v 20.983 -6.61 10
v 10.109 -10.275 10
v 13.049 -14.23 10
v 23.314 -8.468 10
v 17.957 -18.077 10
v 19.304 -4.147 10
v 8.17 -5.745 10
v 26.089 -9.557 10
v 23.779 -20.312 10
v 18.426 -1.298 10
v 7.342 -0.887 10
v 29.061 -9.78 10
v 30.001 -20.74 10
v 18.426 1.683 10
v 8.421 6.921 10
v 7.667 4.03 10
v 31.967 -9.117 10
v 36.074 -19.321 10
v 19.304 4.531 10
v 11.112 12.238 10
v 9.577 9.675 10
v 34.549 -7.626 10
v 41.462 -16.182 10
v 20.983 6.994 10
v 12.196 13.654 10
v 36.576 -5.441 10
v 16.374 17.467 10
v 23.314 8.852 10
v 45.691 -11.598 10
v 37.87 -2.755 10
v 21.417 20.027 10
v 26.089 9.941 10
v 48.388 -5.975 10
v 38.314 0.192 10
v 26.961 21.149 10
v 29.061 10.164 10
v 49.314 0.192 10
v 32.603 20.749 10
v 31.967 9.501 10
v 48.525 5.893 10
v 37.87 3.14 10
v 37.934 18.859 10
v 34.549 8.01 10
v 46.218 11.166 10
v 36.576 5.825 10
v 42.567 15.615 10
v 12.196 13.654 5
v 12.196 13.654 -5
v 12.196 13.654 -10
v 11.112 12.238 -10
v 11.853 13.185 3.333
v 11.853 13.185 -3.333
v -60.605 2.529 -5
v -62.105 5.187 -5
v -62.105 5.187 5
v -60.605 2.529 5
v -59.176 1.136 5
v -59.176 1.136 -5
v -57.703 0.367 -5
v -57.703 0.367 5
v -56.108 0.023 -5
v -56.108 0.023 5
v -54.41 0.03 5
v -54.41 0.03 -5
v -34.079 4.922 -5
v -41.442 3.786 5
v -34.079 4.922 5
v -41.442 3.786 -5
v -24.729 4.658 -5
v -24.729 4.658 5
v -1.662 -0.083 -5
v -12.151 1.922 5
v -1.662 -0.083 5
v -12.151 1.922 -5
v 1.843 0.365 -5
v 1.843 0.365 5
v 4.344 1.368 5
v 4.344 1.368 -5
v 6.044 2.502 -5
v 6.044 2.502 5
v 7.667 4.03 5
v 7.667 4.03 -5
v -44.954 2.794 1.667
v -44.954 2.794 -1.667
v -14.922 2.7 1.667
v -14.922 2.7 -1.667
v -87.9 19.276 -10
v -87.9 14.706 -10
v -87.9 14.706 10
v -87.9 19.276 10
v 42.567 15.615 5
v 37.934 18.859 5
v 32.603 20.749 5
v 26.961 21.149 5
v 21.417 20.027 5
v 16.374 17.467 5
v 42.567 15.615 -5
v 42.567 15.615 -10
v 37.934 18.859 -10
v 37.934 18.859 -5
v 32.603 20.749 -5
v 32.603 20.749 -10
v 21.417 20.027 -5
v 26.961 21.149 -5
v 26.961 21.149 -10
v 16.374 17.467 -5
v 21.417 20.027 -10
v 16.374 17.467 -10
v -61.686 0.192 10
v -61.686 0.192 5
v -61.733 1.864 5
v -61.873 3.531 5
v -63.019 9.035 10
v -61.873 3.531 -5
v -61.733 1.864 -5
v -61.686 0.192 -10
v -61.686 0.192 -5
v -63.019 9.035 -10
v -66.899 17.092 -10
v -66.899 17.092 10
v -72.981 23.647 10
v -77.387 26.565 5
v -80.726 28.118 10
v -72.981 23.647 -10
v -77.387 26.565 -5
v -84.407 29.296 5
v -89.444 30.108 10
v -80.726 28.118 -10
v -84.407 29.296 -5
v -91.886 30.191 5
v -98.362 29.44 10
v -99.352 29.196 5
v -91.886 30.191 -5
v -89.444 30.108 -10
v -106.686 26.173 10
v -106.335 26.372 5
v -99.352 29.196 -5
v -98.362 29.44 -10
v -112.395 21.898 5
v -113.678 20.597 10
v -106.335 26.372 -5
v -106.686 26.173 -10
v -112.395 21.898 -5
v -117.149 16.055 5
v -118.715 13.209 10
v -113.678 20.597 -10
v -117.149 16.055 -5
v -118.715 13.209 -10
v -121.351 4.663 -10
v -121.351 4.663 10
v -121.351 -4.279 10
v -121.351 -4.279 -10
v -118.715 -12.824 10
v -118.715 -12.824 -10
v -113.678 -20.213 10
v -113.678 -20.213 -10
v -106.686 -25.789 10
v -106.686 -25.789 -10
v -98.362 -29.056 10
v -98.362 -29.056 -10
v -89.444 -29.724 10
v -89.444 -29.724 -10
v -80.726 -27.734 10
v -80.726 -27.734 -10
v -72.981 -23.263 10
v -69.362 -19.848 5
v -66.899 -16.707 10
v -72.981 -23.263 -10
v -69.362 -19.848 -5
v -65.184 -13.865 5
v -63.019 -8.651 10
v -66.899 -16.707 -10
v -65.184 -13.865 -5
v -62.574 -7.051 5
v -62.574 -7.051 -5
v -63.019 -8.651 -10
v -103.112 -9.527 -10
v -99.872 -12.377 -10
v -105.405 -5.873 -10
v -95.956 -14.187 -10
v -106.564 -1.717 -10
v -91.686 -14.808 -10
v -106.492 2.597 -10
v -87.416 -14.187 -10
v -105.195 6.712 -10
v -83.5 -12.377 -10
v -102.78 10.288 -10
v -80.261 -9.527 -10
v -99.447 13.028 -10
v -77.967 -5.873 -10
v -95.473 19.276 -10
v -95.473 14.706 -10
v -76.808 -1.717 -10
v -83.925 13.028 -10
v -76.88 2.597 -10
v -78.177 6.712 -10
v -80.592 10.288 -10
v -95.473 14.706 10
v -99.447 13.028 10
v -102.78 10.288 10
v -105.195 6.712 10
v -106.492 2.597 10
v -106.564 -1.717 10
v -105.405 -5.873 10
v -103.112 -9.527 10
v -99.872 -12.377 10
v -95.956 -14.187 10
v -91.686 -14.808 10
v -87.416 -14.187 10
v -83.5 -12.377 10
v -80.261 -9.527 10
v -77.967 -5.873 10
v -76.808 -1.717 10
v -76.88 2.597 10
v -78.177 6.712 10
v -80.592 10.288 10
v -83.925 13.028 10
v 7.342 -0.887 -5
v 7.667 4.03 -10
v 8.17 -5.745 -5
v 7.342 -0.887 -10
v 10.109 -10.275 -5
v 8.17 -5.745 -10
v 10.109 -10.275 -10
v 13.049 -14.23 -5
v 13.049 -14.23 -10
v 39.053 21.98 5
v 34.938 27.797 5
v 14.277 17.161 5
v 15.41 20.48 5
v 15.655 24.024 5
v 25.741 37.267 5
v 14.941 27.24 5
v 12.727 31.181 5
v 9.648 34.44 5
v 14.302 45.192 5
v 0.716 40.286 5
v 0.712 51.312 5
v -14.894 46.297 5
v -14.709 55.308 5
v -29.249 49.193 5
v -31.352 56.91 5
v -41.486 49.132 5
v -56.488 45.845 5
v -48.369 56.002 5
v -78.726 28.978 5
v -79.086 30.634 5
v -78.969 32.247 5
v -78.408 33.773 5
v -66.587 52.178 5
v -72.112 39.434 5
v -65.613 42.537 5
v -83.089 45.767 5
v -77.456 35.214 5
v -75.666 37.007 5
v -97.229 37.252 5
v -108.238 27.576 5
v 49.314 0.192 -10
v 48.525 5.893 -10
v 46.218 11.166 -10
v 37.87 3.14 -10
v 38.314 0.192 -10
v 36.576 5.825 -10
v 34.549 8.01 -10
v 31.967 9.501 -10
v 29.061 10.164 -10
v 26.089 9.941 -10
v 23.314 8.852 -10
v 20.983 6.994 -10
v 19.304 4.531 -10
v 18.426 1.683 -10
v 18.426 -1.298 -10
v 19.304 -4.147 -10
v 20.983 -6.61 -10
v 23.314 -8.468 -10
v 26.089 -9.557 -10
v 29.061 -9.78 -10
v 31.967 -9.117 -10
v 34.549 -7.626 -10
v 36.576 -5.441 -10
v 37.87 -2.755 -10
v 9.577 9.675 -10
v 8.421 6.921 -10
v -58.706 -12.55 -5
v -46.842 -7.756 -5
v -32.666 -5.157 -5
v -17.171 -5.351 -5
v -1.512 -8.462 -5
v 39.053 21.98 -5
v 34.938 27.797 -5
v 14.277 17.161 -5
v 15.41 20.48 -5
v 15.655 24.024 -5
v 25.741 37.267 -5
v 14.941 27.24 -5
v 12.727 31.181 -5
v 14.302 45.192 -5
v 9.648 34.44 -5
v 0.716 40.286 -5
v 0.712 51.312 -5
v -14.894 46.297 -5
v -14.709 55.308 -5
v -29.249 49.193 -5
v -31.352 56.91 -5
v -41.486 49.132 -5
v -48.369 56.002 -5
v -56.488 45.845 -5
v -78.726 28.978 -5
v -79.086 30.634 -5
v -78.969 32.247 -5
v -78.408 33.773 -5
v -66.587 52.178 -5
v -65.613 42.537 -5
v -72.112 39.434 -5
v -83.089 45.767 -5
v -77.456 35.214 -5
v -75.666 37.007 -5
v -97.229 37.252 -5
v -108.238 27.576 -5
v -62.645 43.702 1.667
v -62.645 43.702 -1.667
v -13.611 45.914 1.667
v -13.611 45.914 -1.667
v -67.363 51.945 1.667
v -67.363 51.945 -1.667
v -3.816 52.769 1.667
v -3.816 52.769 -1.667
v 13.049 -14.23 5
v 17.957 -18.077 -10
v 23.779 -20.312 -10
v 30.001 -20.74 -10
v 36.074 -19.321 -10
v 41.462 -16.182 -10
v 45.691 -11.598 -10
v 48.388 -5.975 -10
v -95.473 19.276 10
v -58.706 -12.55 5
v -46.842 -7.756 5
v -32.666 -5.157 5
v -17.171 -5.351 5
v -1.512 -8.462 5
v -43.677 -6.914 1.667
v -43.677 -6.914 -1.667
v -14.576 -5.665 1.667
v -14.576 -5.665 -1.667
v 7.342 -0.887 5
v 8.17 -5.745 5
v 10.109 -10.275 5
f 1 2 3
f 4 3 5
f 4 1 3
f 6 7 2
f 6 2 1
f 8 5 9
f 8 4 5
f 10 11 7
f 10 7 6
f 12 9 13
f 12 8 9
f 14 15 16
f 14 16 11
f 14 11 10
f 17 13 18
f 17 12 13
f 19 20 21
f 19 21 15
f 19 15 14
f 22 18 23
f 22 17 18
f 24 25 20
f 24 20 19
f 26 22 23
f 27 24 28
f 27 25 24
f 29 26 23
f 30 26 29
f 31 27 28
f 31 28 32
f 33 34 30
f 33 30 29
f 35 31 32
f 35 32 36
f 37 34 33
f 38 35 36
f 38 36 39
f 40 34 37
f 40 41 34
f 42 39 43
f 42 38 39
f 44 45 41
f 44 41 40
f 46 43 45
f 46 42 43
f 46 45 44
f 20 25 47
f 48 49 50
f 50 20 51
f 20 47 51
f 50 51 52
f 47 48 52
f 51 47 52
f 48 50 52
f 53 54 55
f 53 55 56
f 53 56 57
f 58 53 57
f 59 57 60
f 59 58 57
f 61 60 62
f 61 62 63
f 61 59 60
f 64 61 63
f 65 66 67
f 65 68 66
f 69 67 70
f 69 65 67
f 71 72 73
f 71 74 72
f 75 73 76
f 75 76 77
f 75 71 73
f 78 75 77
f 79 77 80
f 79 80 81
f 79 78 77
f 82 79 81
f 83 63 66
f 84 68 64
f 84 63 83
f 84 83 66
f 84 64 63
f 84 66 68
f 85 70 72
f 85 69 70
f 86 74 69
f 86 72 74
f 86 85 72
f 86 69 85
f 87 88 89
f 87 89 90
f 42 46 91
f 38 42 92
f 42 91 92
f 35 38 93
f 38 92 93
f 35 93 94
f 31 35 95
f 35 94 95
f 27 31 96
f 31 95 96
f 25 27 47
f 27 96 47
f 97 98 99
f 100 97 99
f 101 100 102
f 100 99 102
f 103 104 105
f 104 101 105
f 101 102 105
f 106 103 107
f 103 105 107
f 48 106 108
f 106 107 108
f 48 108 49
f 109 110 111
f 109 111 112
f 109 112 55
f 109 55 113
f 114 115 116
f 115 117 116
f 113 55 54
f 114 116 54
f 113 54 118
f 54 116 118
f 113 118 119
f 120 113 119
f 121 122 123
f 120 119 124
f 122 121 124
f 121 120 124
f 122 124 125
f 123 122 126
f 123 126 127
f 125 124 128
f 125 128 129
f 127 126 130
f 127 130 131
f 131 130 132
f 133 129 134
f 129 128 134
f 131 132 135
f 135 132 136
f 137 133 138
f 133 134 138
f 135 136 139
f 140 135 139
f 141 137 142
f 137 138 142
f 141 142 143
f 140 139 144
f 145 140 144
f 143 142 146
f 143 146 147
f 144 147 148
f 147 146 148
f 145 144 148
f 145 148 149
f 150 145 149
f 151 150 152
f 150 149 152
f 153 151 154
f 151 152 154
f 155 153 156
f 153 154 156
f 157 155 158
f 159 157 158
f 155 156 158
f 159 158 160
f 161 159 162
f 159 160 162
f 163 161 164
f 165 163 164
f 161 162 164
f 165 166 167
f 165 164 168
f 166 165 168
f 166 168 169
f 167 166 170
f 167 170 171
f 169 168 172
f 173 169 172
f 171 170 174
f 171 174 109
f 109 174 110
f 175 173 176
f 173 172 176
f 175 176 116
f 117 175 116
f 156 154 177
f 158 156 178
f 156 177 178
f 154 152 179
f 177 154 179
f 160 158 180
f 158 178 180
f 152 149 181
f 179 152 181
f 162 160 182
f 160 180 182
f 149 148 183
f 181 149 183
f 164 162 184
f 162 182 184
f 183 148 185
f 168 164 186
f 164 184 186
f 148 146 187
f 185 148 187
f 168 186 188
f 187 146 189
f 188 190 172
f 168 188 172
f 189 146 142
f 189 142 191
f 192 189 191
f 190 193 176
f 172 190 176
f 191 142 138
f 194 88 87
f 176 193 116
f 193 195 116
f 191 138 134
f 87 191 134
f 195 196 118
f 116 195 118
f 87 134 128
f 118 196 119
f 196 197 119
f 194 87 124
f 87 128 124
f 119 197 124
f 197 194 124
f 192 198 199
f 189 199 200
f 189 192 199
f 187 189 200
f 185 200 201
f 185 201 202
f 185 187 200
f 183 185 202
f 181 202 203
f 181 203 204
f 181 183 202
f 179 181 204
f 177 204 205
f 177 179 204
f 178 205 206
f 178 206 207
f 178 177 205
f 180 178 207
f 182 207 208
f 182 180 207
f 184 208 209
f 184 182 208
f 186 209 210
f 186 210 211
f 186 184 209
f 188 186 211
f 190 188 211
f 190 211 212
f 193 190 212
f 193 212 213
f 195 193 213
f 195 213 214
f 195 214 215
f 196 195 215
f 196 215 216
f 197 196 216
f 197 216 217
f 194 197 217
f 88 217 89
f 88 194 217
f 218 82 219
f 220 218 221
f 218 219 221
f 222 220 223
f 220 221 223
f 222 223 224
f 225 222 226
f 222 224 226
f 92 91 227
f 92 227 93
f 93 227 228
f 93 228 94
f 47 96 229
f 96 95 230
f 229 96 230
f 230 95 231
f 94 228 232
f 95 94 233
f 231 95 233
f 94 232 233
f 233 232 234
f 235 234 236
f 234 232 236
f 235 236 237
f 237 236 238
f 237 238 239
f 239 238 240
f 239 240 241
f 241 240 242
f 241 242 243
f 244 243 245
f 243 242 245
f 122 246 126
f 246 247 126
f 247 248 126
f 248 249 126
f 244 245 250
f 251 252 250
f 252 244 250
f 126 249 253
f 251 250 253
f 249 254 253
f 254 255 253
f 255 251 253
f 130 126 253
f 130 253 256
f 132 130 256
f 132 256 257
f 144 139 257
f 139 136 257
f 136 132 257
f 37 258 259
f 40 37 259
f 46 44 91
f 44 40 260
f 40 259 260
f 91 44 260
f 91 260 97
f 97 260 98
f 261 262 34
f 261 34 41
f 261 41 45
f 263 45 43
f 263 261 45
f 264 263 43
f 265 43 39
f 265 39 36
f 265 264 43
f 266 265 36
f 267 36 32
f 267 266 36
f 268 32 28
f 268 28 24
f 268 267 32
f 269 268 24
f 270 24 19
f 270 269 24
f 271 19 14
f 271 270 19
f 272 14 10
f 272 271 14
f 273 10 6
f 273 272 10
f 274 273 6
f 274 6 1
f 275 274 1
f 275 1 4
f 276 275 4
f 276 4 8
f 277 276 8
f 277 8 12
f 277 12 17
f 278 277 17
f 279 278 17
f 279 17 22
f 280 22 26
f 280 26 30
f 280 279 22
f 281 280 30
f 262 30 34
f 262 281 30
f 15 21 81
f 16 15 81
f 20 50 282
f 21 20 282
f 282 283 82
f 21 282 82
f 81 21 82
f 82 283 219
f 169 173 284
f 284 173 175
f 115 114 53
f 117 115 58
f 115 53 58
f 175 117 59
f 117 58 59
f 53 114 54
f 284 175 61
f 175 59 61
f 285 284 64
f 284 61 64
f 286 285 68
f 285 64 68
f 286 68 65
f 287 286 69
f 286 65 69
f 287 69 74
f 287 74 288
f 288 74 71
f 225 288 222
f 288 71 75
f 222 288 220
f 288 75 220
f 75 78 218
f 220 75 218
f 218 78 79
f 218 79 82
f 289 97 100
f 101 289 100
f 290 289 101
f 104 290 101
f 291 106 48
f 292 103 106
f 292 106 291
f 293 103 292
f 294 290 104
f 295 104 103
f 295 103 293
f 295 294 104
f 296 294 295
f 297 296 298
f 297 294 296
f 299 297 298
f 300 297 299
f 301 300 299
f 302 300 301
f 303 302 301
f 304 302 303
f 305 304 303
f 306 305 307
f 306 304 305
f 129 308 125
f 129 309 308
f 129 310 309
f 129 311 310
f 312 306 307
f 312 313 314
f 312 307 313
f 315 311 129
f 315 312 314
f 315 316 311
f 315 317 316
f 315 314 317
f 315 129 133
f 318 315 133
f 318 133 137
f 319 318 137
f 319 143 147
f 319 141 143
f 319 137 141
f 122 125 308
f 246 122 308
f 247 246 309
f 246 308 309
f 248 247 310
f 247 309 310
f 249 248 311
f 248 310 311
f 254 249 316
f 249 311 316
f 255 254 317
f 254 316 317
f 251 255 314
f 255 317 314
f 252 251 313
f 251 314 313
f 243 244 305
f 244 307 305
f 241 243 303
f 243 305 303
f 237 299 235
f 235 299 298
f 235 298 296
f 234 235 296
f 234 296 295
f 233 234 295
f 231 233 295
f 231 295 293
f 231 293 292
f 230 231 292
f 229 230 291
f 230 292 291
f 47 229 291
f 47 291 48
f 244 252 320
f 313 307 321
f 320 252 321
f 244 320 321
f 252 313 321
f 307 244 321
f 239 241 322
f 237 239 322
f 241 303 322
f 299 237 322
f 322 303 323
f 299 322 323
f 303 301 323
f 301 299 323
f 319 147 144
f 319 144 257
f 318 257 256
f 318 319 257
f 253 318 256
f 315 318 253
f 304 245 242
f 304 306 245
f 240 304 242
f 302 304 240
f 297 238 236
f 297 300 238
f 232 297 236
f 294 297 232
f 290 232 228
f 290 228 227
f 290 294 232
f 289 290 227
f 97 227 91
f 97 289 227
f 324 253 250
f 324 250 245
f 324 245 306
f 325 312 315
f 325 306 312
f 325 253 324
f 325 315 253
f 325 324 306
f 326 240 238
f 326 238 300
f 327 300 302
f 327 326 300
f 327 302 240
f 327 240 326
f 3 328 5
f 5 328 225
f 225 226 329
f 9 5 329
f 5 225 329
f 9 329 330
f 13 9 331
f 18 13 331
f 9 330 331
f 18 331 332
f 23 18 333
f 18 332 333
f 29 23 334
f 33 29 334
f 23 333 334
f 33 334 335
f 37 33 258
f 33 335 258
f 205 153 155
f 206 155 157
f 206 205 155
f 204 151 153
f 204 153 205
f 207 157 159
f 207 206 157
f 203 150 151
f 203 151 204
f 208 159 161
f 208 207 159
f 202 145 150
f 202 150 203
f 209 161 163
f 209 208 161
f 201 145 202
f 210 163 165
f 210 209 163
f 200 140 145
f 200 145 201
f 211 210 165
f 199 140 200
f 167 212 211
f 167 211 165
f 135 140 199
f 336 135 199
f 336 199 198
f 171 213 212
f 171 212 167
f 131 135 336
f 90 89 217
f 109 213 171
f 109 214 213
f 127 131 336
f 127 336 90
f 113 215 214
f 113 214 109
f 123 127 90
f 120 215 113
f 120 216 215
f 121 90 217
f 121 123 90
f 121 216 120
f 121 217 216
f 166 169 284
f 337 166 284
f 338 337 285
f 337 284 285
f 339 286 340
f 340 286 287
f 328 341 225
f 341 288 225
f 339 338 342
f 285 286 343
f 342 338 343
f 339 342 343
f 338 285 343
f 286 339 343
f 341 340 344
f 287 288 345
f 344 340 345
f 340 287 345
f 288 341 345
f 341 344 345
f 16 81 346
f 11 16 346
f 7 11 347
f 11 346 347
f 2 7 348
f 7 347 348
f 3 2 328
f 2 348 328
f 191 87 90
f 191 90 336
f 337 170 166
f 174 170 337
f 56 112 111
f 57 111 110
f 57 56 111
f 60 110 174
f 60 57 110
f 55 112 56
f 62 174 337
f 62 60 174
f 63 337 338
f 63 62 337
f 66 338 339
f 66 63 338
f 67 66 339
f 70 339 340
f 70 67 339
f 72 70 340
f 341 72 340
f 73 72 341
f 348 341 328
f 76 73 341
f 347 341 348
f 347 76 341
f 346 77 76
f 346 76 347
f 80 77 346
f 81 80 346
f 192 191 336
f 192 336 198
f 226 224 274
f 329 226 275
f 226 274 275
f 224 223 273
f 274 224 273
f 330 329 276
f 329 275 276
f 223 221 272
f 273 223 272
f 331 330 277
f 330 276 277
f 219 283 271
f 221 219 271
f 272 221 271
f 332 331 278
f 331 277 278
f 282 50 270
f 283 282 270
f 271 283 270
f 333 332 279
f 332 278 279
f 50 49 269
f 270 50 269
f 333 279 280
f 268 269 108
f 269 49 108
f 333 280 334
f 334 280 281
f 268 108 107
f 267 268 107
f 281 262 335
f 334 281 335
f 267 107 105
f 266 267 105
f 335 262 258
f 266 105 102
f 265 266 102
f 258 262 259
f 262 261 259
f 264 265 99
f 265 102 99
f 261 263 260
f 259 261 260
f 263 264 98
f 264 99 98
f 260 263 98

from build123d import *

# Parameters (mm, degrees)
BOSS_EXTRUDE3_DEPTH      = 10
BOSS_EXTRUDE3_DEPTH_BACK = 10
SKETCH1_R                = 30
BOSS_EXTRUDE4_DEPTH      = 10
BOSS_EXTRUDE4_DEPTH_BACK = 10
SKETCH1_6_R              = 10
BOSS_EXTRUDE5_START      = -5
BOSS_EXTRUDE5_DEPTH      = 10
BOSS_EXTRUDE6_DEPTH      = 5
BOSS_EXTRUDE6_DEPTH_BACK = 5


# Read off the part's stored shape, not the designer's step: Boss-Extrude5
with BuildPart() as part:
    # Sketch1 → Boss-Extrude3 (new, two sides: drawn at the far end of the back side and taken through both)
    with BuildSketch(Plane.XY.offset(-BOSS_EXTRUDE3_DEPTH_BACK)):
        with Locations((-91.686183624, 0.192134417)):
            Circle(SKETCH1_R)
        with BuildLine():
            Line((-87.89977254, 14.706371948), (-87.89977254, 19.276034186))
            Line((-87.89977254, 19.276034186), (-95.472594708, 19.276034186))
            Line((-95.472594708, 19.276034186), (-95.472594708, 14.706371948))
            ThreePointArc((-95.472594708, 14.706371948), (-91.686183624, -14.807865583), (-87.89977254, 14.706371948))
        make_face(mode=Mode.SUBTRACT)
    extrude(amount=BOSS_EXTRUDE3_DEPTH + BOSS_EXTRUDE3_DEPTH_BACK)



with BuildPart() as body_2:
    # Sketch1<6> → Boss-Extrude4 (new, two sides: drawn at the far end of the back side and taken through both)
    with BuildSketch(Plane.XY.offset(-BOSS_EXTRUDE4_DEPTH_BACK)):
        with BuildLine():
            ThreePointArc((11.112339015, 12.238261455), (8.949972375, 8.318729369), (7.667477785, 4.02993363))
            ThreePointArc((7.667477785, 4.02993363), (8.170454057, -5.744611701), (13.049003536, -14.229567596))
            ThreePointArc((13.049003536, -14.229567596), (36.073936554, -19.321464298), (49.313816376, 0.192134417))
            ThreePointArc((49.313816376, 0.192134417), (47.553215185, 8.609113298), (42.566622712, 15.614764269))
            ThreePointArc((42.566622712, 15.614764269), (26.961003361, 21.148515234), (12.196391219, 13.65425187))
            add(Edge.make_bspline(
                [(12.196391219, 13.65425187), (11.861354172, 13.187034207), (11.500278102, 12.715041734), (11.112339015, 12.238261455)],
                knots=[0.989038954, 0.989038954, 0.989038954, 0.989038954, 1, 1, 1, 1], degree=3))
        make_face()
        with Locations((28.313816376, 0.192134417)):
            Circle(SKETCH1_6_R, mode=Mode.SUBTRACT)
    extrude(amount=BOSS_EXTRUDE4_DEPTH + BOSS_EXTRUDE4_DEPTH_BACK)


with BuildPart() as part_1:
    add(part.part)

    add(body_2.part)  # Boss-Extrude5 merges body 2
    # Boss-Extrude5 outline → Boss-Extrude5 (add)
    with BuildSketch(Plane.XY.offset(BOSS_EXTRUDE5_START)):
        with BuildLine():
            add(Edge.make_bspline(
                [(-117.149088001, 16.055315078), (-84.551754221, 68.506180692), (15.074459949, 72.729657691), (42.566622712, 15.614764269)],
                knots=[0.000619794, 0.000619794, 0.000619794, 0.000619794, 1, 1, 1, 1], degree=3))
            ThreePointArc((-117.149088001, 16.055315078), (-99.352173325, 29.196144551), (-77.386565231, 26.564864967))
            add(Edge.make_bspline(
                [(-77.386565231, 26.564864967), (-83.432288651, 34.664995437), (-50.628420979, 50.565174626), (-18.016895415, 51.553449374), (24.068279094, 30.209900729), (12.196391219, 13.65425187)],
                knots=[0, 0, 0, 0, 0.204044151, 0.600639193, 0.989038954, 0.989038954, 0.989038954, 0.989038954], degree=3))
            ThreePointArc((12.196391219, 13.65425187), (26.961003361, 21.148515233), (42.566622712, 15.614764269))
        make_face()
    extrude(amount=BOSS_EXTRUDE5_DEPTH)

    # Sketch1<9> → Boss-Extrude6 (add, two sides: drawn at the far end of the back side and taken through both)
    with BuildSketch(Plane.XY.offset(-BOSS_EXTRUDE6_DEPTH_BACK)):
        with BuildLine():
            ThreePointArc((-62.104914378, 5.186982743), (-61.791049594, 2.69831903), (-61.686183624, 0.192134417))
            ThreePointArc((-61.686183624, 0.192134417), (-63.670678381, -10.537798759), (-69.361614689, -19.848165527))
            add(Edge.make_bspline(
                [(-69.361614689, -19.848165527), (-47.016372637, -0.448672031), (-12.207357242, -1.380964616), (13.049003536, -14.229567596)],
                knots=[0, 0, 0, 0, 1, 1, 1, 1], degree=3))
            ThreePointArc((13.049003536, -14.229567596), (8.170454057, -5.744611701), (7.667477785, 4.02993363))
            add(Edge.make_bspline(
                [(-62.104914378, 5.186982743), (-58.601516264, -3.263955738), (-40.915796903, 6.605274961), (-17.364164136, 4.856859209), (1.372861242, -2.886960631), (7.667477785, 4.02993363)],
                knots=[0, 0, 0, 0, 0.26578307, 0.675204605, 1, 1, 1, 1], degree=3))
        make_face()
    extrude(amount=BOSS_EXTRUDE6_DEPTH + BOSS_EXTRUDE6_DEPTH_BACK)


solid = part_1.part
